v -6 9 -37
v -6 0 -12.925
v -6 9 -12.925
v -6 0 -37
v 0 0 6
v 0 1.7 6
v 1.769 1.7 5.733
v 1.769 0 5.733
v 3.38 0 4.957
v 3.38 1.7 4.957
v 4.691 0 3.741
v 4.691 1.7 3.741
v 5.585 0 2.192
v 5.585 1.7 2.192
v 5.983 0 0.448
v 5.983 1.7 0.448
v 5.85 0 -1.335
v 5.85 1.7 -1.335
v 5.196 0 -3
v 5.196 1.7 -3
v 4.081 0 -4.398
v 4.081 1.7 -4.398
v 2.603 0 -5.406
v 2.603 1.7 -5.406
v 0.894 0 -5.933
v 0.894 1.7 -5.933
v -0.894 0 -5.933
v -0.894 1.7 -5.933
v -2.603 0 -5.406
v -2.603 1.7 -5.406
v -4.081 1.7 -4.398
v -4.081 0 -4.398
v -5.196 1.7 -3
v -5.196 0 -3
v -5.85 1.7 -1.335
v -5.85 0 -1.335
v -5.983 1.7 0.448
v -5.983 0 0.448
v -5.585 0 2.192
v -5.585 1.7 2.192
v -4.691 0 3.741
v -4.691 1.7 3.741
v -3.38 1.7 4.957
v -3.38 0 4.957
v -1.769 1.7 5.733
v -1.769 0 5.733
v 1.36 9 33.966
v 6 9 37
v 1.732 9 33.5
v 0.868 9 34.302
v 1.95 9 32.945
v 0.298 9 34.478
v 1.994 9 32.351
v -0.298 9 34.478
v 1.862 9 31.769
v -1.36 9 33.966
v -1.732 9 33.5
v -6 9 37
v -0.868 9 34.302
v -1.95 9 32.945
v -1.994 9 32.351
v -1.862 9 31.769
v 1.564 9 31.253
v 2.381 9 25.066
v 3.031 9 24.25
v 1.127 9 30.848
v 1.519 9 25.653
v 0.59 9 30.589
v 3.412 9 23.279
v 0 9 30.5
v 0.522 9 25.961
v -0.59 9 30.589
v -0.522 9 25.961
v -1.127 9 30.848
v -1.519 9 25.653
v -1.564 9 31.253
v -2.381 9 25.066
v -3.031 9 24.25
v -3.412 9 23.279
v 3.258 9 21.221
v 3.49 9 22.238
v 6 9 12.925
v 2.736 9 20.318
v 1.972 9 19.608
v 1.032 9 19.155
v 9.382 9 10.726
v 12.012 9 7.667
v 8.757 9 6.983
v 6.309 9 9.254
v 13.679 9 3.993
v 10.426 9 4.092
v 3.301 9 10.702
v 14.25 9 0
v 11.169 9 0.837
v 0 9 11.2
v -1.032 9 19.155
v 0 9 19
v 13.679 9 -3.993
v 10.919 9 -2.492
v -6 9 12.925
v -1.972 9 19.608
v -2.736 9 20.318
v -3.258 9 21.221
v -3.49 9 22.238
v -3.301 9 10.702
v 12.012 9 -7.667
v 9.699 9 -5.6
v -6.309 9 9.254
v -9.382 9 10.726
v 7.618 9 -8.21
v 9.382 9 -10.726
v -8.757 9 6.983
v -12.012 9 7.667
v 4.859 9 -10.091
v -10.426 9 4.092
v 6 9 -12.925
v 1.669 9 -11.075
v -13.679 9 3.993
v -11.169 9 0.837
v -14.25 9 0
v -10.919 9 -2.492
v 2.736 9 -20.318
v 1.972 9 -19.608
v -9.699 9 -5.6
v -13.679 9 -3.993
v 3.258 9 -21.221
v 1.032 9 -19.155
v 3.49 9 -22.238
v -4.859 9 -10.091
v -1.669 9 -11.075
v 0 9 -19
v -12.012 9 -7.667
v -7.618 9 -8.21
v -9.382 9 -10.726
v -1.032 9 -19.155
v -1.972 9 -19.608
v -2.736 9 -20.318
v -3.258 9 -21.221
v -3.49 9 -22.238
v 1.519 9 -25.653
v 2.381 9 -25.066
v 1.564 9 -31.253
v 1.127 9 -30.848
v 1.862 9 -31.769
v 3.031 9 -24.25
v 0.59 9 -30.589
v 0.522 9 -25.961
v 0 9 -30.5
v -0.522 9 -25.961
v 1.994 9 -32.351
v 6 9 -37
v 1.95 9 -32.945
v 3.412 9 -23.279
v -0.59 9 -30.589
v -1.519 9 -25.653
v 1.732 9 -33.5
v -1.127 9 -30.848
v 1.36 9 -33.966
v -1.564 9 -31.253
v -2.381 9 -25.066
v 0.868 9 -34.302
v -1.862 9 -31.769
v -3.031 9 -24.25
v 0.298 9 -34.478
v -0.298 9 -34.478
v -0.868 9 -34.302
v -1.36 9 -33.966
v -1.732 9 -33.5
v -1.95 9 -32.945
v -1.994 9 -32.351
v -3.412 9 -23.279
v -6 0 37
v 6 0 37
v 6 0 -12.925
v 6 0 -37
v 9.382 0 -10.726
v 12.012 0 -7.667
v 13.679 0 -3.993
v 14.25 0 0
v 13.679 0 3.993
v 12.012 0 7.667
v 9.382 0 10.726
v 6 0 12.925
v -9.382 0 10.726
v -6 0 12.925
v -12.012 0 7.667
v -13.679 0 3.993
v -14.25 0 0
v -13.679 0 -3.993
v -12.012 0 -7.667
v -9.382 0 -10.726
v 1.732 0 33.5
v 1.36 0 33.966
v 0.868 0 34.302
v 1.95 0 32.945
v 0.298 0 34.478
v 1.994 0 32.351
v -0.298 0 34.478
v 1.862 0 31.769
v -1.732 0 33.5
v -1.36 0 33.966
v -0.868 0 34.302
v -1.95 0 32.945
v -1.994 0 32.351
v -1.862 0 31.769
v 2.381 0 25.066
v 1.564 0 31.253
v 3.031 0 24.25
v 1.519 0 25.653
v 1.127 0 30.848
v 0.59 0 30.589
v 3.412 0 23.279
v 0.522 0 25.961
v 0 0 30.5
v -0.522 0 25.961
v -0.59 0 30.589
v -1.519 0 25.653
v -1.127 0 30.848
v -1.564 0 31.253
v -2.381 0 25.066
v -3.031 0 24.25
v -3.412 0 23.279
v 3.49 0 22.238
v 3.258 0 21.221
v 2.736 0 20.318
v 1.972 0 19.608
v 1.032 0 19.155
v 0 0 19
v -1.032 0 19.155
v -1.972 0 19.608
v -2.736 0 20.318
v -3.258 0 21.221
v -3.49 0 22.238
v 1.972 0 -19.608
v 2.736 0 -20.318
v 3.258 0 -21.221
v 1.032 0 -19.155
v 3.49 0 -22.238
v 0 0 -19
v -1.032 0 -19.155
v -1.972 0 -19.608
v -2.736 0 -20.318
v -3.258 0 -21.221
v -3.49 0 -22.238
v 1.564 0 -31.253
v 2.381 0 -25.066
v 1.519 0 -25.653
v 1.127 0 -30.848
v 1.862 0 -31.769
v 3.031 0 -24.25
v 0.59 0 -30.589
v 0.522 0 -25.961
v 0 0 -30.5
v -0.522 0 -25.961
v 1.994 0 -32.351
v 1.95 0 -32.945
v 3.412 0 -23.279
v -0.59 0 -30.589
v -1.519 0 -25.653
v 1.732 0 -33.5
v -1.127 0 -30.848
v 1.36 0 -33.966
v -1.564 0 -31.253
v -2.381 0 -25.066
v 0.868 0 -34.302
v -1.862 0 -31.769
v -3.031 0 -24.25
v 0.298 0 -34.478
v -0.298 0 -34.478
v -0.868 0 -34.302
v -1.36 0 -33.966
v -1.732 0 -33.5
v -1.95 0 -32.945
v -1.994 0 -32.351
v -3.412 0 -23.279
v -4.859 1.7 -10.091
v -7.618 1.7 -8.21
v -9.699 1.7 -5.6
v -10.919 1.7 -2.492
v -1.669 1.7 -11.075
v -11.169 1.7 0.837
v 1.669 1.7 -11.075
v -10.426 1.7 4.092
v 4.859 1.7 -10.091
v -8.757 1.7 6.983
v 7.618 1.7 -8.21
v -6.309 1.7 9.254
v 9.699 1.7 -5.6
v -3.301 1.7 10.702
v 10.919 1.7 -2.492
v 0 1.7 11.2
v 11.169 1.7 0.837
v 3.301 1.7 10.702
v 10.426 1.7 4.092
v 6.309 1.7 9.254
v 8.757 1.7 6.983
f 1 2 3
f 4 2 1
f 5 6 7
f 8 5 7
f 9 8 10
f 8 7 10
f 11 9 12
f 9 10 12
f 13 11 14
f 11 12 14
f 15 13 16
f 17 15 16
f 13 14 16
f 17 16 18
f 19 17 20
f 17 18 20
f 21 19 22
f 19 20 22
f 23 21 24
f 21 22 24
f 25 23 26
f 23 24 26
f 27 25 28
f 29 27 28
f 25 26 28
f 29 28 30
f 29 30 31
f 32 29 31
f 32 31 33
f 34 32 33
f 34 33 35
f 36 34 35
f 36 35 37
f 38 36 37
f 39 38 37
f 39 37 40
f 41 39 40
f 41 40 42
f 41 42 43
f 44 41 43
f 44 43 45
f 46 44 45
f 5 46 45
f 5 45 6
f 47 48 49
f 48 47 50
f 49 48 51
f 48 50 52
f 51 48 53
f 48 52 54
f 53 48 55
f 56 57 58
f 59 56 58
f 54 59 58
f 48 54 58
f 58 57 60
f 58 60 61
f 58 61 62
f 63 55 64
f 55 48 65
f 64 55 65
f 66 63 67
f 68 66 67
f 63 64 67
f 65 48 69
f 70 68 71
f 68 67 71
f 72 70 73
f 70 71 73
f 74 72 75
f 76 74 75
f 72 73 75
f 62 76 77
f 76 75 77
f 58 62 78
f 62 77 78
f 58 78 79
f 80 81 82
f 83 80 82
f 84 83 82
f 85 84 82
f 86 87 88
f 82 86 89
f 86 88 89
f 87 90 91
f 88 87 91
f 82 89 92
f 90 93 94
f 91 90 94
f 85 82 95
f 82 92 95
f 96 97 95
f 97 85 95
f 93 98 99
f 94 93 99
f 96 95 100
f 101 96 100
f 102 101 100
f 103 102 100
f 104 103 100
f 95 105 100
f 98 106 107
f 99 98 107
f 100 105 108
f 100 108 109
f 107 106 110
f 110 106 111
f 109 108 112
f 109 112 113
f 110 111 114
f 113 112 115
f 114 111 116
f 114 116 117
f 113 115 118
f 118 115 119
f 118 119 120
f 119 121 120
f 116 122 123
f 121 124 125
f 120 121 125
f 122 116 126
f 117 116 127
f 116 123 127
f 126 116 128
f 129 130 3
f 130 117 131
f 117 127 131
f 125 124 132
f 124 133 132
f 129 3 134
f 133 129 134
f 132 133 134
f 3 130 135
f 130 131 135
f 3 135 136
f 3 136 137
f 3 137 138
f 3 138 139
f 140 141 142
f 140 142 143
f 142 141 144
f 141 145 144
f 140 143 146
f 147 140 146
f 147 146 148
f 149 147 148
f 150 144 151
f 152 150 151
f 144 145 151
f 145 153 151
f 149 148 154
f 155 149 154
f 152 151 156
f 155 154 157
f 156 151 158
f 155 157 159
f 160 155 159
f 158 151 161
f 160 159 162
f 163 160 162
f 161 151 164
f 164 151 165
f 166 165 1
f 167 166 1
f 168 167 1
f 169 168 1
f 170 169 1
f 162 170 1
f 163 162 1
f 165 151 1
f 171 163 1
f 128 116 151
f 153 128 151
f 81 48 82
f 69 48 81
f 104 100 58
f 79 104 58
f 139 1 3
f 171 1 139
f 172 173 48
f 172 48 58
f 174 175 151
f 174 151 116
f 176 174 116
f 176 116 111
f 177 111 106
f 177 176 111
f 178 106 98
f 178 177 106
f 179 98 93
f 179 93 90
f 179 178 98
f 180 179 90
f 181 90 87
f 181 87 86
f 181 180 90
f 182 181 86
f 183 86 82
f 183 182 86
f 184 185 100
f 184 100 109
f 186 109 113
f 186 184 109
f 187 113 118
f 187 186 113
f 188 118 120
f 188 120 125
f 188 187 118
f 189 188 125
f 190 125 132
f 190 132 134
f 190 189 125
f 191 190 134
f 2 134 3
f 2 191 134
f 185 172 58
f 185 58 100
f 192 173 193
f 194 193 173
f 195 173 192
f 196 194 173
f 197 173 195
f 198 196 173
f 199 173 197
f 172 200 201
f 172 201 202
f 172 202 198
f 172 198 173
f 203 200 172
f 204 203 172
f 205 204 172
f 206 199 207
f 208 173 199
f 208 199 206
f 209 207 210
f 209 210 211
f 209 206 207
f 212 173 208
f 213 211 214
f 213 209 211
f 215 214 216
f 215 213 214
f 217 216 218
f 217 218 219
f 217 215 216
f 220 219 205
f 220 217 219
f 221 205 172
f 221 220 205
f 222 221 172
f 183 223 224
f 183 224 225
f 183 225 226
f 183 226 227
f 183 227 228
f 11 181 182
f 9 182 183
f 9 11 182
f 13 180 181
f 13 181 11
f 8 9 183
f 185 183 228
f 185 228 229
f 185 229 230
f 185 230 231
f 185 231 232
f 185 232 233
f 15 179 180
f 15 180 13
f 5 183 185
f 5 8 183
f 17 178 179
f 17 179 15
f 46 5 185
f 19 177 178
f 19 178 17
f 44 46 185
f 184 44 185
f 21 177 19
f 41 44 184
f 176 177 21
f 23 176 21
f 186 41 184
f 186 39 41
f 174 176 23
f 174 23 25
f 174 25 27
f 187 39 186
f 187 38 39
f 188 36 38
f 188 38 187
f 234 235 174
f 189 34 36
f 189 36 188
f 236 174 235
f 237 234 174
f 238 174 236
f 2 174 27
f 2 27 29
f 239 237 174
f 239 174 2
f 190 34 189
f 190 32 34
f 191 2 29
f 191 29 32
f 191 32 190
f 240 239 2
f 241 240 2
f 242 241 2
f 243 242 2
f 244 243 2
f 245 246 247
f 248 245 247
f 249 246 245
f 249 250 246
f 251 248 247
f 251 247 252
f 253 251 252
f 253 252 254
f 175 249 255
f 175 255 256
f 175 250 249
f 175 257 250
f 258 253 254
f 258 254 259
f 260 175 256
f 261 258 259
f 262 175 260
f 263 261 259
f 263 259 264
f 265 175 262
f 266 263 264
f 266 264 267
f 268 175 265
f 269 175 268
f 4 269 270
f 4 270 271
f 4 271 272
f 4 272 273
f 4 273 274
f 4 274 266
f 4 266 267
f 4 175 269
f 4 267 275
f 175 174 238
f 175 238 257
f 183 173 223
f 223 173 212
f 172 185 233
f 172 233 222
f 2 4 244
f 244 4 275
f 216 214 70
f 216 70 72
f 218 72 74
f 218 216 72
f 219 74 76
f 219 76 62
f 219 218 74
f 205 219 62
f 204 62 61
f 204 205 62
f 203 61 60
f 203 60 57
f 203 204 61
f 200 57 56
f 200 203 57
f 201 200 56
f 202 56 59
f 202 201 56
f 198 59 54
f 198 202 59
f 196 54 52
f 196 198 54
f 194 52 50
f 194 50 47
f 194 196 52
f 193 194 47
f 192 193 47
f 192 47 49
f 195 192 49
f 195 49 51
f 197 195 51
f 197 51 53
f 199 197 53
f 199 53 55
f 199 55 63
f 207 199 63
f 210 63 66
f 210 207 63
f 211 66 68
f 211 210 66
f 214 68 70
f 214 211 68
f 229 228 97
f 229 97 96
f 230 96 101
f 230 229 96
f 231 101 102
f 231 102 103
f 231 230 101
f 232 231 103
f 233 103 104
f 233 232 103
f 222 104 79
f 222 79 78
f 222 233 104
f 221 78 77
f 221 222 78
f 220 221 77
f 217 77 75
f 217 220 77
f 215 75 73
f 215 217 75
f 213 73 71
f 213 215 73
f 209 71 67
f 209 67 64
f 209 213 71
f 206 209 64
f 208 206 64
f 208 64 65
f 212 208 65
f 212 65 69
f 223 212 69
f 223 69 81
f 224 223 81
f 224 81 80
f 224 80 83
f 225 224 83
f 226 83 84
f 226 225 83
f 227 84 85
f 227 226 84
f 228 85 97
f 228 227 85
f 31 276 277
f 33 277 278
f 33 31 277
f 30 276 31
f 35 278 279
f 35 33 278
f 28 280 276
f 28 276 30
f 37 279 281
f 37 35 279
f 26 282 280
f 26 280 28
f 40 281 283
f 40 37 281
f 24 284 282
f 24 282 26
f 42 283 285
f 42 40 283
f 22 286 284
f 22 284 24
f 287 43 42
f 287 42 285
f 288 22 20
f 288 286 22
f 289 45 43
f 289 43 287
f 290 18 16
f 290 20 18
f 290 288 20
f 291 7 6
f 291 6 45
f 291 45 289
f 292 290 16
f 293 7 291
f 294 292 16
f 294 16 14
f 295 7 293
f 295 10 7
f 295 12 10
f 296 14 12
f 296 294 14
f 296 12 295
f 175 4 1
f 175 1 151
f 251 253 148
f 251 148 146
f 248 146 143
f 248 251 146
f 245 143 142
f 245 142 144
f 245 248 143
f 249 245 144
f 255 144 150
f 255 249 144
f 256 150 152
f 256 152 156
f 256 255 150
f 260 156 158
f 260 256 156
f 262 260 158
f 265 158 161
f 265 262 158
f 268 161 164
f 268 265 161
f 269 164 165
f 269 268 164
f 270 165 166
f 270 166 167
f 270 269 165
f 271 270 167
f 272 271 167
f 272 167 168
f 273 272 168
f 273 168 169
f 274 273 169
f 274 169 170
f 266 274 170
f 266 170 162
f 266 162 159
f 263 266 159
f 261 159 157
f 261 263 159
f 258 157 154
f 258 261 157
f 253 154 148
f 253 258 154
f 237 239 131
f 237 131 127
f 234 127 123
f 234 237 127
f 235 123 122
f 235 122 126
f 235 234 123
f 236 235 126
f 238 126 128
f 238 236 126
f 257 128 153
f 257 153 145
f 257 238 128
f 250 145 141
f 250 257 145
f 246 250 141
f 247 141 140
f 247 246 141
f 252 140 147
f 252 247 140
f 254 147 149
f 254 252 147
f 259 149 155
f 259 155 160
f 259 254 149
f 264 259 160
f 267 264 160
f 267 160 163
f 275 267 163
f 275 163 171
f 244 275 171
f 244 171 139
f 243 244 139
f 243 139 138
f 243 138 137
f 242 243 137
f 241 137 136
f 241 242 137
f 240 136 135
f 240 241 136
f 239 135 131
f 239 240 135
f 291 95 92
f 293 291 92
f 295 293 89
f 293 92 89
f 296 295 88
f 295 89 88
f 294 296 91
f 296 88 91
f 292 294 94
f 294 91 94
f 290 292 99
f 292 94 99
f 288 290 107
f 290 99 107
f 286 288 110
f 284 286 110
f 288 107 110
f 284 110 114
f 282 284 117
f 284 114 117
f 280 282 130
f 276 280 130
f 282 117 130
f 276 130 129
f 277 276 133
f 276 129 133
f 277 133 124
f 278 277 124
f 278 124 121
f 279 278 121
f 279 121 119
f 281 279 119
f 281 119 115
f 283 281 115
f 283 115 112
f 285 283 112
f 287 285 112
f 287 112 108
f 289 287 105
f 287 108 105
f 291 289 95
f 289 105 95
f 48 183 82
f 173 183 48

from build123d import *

# Parameters (mm, degrees)
SKETCH1_R           = 3.5
SKETCH1_R_2         = 2
BOSS_EXTRUDE1_DEPTH = 9
SKETCH2_R           = 11.2
CUT_EXTRUDE1_DEPTH  = 7.3
CUT_EXTRUDE2_REACH  = 42.316
SKETCH3_R           = 6


with BuildPart() as part:
    # Sketch1 → Boss-Extrude1 (new body)
    with BuildSketch(Plane(origin=(0, 0, 0), x_dir=(1, 0, 0), z_dir=(0, 1, 0))):
        with BuildLine():
            Line((-6, 37), (6, 37))
            Line((6, 37), (6, 12.925265955))
            ThreePointArc((6, 12.925265955), (14.25, 0), (6, -12.925265955))
            Line((6, -12.925265955), (6, -37))
            Line((6, -37), (-6, -37))
            Line((-6, -37), (-6, -12.925265955))
            ThreePointArc((-6, -12.925265955), (-14.25, 0), (-6, 12.925265955))
            Line((-6, 12.925265955), (-6, 37))
        make_face()
        with Locations(Location((0, 22.5, 0), (0, 0, 270))):
            Circle(SKETCH1_R, mode=Mode.SUBTRACT)
        with Locations(Location((0, 32.5, 0), (0, 0, 270))):
            Circle(SKETCH1_R_2, mode=Mode.SUBTRACT)
        with Locations(Location((0, -22.5, 0), (0, 0, 90))):
            Circle(SKETCH1_R, mode=Mode.SUBTRACT)
        with Locations(Location((0, -32.5, 0), (0, 0, 90))):
            Circle(SKETCH1_R_2, mode=Mode.SUBTRACT)
    extrude(amount=BOSS_EXTRUDE1_DEPTH)

    # Sketch2 → Cut-Extrude1 (cut)
    with BuildSketch(Plane(origin=(0, 9, 0), x_dir=(1, 0, 0), z_dir=(0, 1, 0))):
        with Locations(Location((0, 0, 0), (0, 0, 270))):
            Circle(SKETCH2_R)
    extrude(amount=-CUT_EXTRUDE1_DEPTH, mode=Mode.SUBTRACT)

    # Sketch3 → Cut-Extrude2 (cut, up to next)
    with BuildSketch(Plane(origin=(0, 1.7, 0), x_dir=(1, 0, 0), z_dir=(0, 1, 0)), mode=Mode.PRIVATE) as cut_extrude2_sk1:
        with Locations(Location((0, 0, 0), (0, 0, 270))):
            Circle(SKETCH3_R)
    cut_extrude2_tool1 = extrude(cut_extrude2_sk1.sketch, amount=-CUT_EXTRUDE2_REACH, mode=Mode.PRIVATE) & part.part
    add(cut_extrude2_tool1.solids().sort_by_distance((0, 1.7, 0))[0], mode=Mode.SUBTRACT)


solid = part.part
